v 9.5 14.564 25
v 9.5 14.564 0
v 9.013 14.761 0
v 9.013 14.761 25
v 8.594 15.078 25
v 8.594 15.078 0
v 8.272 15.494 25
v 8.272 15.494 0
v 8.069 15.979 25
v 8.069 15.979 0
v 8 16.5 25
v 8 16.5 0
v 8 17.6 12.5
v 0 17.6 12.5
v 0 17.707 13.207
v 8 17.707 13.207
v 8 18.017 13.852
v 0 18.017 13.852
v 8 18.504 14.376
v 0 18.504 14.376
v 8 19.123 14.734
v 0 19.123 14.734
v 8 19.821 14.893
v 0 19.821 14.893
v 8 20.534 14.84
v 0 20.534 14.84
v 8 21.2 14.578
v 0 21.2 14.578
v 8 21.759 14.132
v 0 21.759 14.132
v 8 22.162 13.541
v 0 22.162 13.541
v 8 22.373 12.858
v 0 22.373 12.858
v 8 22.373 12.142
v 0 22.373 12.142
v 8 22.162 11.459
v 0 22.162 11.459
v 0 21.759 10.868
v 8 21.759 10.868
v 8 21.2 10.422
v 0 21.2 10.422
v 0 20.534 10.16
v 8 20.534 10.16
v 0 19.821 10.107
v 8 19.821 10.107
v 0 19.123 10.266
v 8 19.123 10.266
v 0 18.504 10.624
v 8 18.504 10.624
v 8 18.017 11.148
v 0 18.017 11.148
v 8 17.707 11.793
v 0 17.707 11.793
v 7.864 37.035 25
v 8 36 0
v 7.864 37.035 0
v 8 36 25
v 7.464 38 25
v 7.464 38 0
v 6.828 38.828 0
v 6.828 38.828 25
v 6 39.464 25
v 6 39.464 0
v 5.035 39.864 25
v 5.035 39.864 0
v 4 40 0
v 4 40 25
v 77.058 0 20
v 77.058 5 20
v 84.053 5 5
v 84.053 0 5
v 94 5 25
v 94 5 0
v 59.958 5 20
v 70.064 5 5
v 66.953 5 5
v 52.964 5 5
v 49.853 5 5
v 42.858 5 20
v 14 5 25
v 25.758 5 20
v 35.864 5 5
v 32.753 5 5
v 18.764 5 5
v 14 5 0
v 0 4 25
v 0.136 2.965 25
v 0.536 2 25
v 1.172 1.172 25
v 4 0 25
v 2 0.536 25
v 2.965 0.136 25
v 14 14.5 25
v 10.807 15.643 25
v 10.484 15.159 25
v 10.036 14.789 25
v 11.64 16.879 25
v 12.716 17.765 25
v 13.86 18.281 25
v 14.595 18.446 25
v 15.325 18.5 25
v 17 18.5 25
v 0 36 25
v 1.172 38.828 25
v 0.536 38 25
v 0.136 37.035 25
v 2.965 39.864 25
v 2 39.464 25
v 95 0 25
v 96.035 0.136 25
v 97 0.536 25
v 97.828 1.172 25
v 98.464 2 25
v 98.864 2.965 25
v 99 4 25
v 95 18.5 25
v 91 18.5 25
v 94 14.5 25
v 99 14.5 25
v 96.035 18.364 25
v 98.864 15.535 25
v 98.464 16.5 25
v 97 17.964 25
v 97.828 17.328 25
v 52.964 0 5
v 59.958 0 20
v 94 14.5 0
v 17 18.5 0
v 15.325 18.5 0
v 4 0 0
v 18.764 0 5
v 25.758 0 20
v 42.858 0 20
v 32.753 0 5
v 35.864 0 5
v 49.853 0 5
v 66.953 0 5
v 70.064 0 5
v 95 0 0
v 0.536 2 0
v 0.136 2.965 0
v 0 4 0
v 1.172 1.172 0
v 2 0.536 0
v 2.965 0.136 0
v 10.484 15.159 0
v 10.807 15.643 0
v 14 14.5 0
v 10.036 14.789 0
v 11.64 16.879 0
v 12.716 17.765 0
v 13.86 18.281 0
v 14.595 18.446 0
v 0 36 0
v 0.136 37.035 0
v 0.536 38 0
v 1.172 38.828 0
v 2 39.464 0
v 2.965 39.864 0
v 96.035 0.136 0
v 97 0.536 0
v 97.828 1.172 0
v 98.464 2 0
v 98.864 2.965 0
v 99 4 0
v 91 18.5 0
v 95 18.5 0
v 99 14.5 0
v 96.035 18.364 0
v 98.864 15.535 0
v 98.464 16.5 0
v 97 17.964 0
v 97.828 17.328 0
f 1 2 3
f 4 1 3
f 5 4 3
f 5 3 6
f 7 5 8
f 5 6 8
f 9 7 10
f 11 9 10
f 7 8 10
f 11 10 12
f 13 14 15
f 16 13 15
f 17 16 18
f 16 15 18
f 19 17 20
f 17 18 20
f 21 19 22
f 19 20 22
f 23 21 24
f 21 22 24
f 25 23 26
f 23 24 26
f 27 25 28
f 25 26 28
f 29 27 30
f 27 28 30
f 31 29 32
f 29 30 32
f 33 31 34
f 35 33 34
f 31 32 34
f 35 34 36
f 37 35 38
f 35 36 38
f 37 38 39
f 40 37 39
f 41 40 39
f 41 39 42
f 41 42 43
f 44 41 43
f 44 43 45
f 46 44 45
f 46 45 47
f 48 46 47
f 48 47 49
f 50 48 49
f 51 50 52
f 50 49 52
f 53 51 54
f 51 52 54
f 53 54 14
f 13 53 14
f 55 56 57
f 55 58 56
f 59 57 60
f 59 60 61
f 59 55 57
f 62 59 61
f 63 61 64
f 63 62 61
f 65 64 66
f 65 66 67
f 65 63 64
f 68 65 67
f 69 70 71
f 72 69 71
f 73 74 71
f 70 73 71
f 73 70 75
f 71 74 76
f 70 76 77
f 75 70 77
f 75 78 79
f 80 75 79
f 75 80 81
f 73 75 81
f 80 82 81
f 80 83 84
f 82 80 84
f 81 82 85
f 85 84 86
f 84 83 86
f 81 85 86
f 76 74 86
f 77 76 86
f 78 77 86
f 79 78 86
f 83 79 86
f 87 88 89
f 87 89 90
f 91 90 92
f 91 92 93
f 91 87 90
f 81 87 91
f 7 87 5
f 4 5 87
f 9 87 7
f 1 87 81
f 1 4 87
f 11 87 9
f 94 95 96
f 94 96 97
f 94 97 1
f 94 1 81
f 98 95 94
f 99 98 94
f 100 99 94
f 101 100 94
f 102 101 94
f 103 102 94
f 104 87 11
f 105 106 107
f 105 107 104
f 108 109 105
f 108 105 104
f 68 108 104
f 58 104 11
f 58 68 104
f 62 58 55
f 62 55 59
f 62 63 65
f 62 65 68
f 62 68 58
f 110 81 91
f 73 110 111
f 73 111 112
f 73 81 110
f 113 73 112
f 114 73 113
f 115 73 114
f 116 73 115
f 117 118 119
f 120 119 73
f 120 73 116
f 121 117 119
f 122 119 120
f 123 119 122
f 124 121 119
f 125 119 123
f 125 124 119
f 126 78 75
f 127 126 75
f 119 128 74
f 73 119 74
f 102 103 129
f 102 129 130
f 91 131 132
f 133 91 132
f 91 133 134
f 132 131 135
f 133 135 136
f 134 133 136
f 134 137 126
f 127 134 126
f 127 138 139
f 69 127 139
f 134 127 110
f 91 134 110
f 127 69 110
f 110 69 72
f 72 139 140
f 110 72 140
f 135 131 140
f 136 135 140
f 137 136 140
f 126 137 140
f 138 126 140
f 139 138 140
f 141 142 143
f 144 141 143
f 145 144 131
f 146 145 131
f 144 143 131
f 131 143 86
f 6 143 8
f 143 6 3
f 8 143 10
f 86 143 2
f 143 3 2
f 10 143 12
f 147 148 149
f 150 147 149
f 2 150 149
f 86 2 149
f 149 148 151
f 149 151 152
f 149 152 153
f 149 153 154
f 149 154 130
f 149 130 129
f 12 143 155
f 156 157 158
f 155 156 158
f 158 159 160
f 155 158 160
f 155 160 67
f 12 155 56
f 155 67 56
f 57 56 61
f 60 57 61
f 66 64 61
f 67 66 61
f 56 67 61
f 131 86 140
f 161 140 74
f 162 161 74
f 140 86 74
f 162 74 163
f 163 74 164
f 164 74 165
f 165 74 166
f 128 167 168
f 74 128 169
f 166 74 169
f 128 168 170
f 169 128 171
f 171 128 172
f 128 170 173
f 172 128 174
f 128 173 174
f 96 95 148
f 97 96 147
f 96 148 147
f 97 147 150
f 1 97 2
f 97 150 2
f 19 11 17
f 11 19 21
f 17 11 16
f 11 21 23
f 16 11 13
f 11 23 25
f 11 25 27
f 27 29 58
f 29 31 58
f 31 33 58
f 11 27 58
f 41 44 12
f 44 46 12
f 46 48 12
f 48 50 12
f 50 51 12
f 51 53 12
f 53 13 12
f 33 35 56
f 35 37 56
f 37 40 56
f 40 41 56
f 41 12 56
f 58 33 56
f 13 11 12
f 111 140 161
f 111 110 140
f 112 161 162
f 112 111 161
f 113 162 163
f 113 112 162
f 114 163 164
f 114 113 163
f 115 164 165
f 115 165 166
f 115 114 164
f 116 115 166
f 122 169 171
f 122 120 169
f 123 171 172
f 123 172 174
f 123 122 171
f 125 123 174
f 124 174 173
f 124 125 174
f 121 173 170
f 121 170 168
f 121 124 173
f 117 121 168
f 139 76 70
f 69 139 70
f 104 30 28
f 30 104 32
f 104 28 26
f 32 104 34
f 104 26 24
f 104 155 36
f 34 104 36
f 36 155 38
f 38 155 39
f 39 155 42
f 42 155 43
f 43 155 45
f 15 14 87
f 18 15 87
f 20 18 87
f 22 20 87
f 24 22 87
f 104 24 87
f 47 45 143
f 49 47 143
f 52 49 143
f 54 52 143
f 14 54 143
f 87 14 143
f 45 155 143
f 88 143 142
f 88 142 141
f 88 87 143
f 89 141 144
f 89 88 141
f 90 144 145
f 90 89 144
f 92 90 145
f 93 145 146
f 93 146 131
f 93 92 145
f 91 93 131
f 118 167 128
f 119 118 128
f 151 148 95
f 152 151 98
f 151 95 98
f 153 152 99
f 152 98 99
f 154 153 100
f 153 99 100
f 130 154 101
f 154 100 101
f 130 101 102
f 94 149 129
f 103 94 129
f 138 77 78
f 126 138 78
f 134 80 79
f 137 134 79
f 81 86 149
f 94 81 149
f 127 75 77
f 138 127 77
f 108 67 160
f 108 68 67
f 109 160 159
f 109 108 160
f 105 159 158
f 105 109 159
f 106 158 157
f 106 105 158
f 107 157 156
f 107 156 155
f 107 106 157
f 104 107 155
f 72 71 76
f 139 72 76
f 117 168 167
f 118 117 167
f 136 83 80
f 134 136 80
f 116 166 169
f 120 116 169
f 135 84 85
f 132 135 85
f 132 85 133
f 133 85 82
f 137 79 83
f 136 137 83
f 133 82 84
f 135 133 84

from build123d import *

# Parameters (mm, degrees)
F1_DEPTH    = 25
F2_T1_DEPTH = 25
F3_R        = 5
F4_R        = 3.99999
F5_R        = 2.4
F6_DEPTH    = 8
F8_DEPTH    = 5


# Not quite as in the source:
# - a fillet or chamfer that OpenCascade refuses, or shapes differently, is made with other operations: its cross-section is extruded or revolved along the edge and cut away or added
# - a fillet or chamfer is up to 0.001 mm smaller than in the source, because OpenCascade refuses the exact size


with BuildPart() as f1:
    # F0 (on Top) → F1 (new body)
    with BuildSketch(Plane.XY):
        Polygon((8, 40), (0, 40), (0, 0), (99, 0), (99, 18.5), (91, 18.5), (94, 14.5), (94, 5), (14, 5), (14, 14.5), (17, 18.5), (11, 18.5), (11, 14.5), (8, 14.5), align=None)
    extrude(amount=F1_DEPTH)

    # F2: fillet of radius 2 on 2 edges, made by hand

    # F2_s2 → F2_t1 (join)
    with BuildSketch(Plane.XY):
        with BuildLine():
            ThreePointArc((11, 16.5), (10.4142135624, 15.0857864376), (9, 14.5))
            Line((9, 14.5), (11, 14.5))
            Line((11, 14.5), (11, 16.5))
        make_face()
        with BuildLine():
            ThreePointArc((10, 14.5), (8.5857864376, 15.0857864376), (8, 16.5))
            Line((8, 16.5), (8, 14.5))
            Line((8, 14.5), (10, 14.5))
        make_face()
    extrude(amount=F2_T1_DEPTH)

    # F3
    f3_edges = [f1.edges().sort_by_distance(p)[0] for p in [
        (11, 18.5, 12.5),
    ]]
    fillet(f3_edges, radius=F3_R)

    # F4 (radius 4 in the source; OpenCascade refuses exactly that, so slightly less here)
    f4_edges = [f1.edges().sort_by_distance(p)[0] for p in [
        (99, 18.5, 12.5),
        (99, 0, 12.5),
        (0, 0, 12.5),
        (0, 40, 12.5),
        (8, 40, 12.5),
    ]]
    fillet(f4_edges, radius=F4_R)

    # F5 (on face) → F6 (cut, through all)
    with BuildSketch(Plane(origin=(0, 0, 0), x_dir=(0, -1, 0), z_dir=(-1, 0, 0))):
        with Locations((-20, 12.5)):
            Circle(F5_R)
    extrude(amount=-F6_DEPTH, mode=Mode.SUBTRACT)

    # F7 (on face) → F8 (cut, through all)
    with BuildSketch(Plane(origin=(0, 5, 0), x_dir=(-1, 0, 0), z_dir=(0, 1, 0))):
        Polygon((-77.0584673027, 20), (-84.053082175, 5), (-70.0638524304, 5), align=None)
        Polygon((-66.953082175, 5), (-52.9638524304, 5), (-59.9584673027, 20), align=None)
        Polygon((-49.853082175, 5), (-35.8638524304, 5), (-42.8584673027, 20), align=None)
        Polygon((-32.753082175, 5), (-18.7638524304, 5), (-25.7584673027, 20), align=None)
    extrude(amount=-F8_DEPTH, mode=Mode.SUBTRACT)


solid = f1.part
